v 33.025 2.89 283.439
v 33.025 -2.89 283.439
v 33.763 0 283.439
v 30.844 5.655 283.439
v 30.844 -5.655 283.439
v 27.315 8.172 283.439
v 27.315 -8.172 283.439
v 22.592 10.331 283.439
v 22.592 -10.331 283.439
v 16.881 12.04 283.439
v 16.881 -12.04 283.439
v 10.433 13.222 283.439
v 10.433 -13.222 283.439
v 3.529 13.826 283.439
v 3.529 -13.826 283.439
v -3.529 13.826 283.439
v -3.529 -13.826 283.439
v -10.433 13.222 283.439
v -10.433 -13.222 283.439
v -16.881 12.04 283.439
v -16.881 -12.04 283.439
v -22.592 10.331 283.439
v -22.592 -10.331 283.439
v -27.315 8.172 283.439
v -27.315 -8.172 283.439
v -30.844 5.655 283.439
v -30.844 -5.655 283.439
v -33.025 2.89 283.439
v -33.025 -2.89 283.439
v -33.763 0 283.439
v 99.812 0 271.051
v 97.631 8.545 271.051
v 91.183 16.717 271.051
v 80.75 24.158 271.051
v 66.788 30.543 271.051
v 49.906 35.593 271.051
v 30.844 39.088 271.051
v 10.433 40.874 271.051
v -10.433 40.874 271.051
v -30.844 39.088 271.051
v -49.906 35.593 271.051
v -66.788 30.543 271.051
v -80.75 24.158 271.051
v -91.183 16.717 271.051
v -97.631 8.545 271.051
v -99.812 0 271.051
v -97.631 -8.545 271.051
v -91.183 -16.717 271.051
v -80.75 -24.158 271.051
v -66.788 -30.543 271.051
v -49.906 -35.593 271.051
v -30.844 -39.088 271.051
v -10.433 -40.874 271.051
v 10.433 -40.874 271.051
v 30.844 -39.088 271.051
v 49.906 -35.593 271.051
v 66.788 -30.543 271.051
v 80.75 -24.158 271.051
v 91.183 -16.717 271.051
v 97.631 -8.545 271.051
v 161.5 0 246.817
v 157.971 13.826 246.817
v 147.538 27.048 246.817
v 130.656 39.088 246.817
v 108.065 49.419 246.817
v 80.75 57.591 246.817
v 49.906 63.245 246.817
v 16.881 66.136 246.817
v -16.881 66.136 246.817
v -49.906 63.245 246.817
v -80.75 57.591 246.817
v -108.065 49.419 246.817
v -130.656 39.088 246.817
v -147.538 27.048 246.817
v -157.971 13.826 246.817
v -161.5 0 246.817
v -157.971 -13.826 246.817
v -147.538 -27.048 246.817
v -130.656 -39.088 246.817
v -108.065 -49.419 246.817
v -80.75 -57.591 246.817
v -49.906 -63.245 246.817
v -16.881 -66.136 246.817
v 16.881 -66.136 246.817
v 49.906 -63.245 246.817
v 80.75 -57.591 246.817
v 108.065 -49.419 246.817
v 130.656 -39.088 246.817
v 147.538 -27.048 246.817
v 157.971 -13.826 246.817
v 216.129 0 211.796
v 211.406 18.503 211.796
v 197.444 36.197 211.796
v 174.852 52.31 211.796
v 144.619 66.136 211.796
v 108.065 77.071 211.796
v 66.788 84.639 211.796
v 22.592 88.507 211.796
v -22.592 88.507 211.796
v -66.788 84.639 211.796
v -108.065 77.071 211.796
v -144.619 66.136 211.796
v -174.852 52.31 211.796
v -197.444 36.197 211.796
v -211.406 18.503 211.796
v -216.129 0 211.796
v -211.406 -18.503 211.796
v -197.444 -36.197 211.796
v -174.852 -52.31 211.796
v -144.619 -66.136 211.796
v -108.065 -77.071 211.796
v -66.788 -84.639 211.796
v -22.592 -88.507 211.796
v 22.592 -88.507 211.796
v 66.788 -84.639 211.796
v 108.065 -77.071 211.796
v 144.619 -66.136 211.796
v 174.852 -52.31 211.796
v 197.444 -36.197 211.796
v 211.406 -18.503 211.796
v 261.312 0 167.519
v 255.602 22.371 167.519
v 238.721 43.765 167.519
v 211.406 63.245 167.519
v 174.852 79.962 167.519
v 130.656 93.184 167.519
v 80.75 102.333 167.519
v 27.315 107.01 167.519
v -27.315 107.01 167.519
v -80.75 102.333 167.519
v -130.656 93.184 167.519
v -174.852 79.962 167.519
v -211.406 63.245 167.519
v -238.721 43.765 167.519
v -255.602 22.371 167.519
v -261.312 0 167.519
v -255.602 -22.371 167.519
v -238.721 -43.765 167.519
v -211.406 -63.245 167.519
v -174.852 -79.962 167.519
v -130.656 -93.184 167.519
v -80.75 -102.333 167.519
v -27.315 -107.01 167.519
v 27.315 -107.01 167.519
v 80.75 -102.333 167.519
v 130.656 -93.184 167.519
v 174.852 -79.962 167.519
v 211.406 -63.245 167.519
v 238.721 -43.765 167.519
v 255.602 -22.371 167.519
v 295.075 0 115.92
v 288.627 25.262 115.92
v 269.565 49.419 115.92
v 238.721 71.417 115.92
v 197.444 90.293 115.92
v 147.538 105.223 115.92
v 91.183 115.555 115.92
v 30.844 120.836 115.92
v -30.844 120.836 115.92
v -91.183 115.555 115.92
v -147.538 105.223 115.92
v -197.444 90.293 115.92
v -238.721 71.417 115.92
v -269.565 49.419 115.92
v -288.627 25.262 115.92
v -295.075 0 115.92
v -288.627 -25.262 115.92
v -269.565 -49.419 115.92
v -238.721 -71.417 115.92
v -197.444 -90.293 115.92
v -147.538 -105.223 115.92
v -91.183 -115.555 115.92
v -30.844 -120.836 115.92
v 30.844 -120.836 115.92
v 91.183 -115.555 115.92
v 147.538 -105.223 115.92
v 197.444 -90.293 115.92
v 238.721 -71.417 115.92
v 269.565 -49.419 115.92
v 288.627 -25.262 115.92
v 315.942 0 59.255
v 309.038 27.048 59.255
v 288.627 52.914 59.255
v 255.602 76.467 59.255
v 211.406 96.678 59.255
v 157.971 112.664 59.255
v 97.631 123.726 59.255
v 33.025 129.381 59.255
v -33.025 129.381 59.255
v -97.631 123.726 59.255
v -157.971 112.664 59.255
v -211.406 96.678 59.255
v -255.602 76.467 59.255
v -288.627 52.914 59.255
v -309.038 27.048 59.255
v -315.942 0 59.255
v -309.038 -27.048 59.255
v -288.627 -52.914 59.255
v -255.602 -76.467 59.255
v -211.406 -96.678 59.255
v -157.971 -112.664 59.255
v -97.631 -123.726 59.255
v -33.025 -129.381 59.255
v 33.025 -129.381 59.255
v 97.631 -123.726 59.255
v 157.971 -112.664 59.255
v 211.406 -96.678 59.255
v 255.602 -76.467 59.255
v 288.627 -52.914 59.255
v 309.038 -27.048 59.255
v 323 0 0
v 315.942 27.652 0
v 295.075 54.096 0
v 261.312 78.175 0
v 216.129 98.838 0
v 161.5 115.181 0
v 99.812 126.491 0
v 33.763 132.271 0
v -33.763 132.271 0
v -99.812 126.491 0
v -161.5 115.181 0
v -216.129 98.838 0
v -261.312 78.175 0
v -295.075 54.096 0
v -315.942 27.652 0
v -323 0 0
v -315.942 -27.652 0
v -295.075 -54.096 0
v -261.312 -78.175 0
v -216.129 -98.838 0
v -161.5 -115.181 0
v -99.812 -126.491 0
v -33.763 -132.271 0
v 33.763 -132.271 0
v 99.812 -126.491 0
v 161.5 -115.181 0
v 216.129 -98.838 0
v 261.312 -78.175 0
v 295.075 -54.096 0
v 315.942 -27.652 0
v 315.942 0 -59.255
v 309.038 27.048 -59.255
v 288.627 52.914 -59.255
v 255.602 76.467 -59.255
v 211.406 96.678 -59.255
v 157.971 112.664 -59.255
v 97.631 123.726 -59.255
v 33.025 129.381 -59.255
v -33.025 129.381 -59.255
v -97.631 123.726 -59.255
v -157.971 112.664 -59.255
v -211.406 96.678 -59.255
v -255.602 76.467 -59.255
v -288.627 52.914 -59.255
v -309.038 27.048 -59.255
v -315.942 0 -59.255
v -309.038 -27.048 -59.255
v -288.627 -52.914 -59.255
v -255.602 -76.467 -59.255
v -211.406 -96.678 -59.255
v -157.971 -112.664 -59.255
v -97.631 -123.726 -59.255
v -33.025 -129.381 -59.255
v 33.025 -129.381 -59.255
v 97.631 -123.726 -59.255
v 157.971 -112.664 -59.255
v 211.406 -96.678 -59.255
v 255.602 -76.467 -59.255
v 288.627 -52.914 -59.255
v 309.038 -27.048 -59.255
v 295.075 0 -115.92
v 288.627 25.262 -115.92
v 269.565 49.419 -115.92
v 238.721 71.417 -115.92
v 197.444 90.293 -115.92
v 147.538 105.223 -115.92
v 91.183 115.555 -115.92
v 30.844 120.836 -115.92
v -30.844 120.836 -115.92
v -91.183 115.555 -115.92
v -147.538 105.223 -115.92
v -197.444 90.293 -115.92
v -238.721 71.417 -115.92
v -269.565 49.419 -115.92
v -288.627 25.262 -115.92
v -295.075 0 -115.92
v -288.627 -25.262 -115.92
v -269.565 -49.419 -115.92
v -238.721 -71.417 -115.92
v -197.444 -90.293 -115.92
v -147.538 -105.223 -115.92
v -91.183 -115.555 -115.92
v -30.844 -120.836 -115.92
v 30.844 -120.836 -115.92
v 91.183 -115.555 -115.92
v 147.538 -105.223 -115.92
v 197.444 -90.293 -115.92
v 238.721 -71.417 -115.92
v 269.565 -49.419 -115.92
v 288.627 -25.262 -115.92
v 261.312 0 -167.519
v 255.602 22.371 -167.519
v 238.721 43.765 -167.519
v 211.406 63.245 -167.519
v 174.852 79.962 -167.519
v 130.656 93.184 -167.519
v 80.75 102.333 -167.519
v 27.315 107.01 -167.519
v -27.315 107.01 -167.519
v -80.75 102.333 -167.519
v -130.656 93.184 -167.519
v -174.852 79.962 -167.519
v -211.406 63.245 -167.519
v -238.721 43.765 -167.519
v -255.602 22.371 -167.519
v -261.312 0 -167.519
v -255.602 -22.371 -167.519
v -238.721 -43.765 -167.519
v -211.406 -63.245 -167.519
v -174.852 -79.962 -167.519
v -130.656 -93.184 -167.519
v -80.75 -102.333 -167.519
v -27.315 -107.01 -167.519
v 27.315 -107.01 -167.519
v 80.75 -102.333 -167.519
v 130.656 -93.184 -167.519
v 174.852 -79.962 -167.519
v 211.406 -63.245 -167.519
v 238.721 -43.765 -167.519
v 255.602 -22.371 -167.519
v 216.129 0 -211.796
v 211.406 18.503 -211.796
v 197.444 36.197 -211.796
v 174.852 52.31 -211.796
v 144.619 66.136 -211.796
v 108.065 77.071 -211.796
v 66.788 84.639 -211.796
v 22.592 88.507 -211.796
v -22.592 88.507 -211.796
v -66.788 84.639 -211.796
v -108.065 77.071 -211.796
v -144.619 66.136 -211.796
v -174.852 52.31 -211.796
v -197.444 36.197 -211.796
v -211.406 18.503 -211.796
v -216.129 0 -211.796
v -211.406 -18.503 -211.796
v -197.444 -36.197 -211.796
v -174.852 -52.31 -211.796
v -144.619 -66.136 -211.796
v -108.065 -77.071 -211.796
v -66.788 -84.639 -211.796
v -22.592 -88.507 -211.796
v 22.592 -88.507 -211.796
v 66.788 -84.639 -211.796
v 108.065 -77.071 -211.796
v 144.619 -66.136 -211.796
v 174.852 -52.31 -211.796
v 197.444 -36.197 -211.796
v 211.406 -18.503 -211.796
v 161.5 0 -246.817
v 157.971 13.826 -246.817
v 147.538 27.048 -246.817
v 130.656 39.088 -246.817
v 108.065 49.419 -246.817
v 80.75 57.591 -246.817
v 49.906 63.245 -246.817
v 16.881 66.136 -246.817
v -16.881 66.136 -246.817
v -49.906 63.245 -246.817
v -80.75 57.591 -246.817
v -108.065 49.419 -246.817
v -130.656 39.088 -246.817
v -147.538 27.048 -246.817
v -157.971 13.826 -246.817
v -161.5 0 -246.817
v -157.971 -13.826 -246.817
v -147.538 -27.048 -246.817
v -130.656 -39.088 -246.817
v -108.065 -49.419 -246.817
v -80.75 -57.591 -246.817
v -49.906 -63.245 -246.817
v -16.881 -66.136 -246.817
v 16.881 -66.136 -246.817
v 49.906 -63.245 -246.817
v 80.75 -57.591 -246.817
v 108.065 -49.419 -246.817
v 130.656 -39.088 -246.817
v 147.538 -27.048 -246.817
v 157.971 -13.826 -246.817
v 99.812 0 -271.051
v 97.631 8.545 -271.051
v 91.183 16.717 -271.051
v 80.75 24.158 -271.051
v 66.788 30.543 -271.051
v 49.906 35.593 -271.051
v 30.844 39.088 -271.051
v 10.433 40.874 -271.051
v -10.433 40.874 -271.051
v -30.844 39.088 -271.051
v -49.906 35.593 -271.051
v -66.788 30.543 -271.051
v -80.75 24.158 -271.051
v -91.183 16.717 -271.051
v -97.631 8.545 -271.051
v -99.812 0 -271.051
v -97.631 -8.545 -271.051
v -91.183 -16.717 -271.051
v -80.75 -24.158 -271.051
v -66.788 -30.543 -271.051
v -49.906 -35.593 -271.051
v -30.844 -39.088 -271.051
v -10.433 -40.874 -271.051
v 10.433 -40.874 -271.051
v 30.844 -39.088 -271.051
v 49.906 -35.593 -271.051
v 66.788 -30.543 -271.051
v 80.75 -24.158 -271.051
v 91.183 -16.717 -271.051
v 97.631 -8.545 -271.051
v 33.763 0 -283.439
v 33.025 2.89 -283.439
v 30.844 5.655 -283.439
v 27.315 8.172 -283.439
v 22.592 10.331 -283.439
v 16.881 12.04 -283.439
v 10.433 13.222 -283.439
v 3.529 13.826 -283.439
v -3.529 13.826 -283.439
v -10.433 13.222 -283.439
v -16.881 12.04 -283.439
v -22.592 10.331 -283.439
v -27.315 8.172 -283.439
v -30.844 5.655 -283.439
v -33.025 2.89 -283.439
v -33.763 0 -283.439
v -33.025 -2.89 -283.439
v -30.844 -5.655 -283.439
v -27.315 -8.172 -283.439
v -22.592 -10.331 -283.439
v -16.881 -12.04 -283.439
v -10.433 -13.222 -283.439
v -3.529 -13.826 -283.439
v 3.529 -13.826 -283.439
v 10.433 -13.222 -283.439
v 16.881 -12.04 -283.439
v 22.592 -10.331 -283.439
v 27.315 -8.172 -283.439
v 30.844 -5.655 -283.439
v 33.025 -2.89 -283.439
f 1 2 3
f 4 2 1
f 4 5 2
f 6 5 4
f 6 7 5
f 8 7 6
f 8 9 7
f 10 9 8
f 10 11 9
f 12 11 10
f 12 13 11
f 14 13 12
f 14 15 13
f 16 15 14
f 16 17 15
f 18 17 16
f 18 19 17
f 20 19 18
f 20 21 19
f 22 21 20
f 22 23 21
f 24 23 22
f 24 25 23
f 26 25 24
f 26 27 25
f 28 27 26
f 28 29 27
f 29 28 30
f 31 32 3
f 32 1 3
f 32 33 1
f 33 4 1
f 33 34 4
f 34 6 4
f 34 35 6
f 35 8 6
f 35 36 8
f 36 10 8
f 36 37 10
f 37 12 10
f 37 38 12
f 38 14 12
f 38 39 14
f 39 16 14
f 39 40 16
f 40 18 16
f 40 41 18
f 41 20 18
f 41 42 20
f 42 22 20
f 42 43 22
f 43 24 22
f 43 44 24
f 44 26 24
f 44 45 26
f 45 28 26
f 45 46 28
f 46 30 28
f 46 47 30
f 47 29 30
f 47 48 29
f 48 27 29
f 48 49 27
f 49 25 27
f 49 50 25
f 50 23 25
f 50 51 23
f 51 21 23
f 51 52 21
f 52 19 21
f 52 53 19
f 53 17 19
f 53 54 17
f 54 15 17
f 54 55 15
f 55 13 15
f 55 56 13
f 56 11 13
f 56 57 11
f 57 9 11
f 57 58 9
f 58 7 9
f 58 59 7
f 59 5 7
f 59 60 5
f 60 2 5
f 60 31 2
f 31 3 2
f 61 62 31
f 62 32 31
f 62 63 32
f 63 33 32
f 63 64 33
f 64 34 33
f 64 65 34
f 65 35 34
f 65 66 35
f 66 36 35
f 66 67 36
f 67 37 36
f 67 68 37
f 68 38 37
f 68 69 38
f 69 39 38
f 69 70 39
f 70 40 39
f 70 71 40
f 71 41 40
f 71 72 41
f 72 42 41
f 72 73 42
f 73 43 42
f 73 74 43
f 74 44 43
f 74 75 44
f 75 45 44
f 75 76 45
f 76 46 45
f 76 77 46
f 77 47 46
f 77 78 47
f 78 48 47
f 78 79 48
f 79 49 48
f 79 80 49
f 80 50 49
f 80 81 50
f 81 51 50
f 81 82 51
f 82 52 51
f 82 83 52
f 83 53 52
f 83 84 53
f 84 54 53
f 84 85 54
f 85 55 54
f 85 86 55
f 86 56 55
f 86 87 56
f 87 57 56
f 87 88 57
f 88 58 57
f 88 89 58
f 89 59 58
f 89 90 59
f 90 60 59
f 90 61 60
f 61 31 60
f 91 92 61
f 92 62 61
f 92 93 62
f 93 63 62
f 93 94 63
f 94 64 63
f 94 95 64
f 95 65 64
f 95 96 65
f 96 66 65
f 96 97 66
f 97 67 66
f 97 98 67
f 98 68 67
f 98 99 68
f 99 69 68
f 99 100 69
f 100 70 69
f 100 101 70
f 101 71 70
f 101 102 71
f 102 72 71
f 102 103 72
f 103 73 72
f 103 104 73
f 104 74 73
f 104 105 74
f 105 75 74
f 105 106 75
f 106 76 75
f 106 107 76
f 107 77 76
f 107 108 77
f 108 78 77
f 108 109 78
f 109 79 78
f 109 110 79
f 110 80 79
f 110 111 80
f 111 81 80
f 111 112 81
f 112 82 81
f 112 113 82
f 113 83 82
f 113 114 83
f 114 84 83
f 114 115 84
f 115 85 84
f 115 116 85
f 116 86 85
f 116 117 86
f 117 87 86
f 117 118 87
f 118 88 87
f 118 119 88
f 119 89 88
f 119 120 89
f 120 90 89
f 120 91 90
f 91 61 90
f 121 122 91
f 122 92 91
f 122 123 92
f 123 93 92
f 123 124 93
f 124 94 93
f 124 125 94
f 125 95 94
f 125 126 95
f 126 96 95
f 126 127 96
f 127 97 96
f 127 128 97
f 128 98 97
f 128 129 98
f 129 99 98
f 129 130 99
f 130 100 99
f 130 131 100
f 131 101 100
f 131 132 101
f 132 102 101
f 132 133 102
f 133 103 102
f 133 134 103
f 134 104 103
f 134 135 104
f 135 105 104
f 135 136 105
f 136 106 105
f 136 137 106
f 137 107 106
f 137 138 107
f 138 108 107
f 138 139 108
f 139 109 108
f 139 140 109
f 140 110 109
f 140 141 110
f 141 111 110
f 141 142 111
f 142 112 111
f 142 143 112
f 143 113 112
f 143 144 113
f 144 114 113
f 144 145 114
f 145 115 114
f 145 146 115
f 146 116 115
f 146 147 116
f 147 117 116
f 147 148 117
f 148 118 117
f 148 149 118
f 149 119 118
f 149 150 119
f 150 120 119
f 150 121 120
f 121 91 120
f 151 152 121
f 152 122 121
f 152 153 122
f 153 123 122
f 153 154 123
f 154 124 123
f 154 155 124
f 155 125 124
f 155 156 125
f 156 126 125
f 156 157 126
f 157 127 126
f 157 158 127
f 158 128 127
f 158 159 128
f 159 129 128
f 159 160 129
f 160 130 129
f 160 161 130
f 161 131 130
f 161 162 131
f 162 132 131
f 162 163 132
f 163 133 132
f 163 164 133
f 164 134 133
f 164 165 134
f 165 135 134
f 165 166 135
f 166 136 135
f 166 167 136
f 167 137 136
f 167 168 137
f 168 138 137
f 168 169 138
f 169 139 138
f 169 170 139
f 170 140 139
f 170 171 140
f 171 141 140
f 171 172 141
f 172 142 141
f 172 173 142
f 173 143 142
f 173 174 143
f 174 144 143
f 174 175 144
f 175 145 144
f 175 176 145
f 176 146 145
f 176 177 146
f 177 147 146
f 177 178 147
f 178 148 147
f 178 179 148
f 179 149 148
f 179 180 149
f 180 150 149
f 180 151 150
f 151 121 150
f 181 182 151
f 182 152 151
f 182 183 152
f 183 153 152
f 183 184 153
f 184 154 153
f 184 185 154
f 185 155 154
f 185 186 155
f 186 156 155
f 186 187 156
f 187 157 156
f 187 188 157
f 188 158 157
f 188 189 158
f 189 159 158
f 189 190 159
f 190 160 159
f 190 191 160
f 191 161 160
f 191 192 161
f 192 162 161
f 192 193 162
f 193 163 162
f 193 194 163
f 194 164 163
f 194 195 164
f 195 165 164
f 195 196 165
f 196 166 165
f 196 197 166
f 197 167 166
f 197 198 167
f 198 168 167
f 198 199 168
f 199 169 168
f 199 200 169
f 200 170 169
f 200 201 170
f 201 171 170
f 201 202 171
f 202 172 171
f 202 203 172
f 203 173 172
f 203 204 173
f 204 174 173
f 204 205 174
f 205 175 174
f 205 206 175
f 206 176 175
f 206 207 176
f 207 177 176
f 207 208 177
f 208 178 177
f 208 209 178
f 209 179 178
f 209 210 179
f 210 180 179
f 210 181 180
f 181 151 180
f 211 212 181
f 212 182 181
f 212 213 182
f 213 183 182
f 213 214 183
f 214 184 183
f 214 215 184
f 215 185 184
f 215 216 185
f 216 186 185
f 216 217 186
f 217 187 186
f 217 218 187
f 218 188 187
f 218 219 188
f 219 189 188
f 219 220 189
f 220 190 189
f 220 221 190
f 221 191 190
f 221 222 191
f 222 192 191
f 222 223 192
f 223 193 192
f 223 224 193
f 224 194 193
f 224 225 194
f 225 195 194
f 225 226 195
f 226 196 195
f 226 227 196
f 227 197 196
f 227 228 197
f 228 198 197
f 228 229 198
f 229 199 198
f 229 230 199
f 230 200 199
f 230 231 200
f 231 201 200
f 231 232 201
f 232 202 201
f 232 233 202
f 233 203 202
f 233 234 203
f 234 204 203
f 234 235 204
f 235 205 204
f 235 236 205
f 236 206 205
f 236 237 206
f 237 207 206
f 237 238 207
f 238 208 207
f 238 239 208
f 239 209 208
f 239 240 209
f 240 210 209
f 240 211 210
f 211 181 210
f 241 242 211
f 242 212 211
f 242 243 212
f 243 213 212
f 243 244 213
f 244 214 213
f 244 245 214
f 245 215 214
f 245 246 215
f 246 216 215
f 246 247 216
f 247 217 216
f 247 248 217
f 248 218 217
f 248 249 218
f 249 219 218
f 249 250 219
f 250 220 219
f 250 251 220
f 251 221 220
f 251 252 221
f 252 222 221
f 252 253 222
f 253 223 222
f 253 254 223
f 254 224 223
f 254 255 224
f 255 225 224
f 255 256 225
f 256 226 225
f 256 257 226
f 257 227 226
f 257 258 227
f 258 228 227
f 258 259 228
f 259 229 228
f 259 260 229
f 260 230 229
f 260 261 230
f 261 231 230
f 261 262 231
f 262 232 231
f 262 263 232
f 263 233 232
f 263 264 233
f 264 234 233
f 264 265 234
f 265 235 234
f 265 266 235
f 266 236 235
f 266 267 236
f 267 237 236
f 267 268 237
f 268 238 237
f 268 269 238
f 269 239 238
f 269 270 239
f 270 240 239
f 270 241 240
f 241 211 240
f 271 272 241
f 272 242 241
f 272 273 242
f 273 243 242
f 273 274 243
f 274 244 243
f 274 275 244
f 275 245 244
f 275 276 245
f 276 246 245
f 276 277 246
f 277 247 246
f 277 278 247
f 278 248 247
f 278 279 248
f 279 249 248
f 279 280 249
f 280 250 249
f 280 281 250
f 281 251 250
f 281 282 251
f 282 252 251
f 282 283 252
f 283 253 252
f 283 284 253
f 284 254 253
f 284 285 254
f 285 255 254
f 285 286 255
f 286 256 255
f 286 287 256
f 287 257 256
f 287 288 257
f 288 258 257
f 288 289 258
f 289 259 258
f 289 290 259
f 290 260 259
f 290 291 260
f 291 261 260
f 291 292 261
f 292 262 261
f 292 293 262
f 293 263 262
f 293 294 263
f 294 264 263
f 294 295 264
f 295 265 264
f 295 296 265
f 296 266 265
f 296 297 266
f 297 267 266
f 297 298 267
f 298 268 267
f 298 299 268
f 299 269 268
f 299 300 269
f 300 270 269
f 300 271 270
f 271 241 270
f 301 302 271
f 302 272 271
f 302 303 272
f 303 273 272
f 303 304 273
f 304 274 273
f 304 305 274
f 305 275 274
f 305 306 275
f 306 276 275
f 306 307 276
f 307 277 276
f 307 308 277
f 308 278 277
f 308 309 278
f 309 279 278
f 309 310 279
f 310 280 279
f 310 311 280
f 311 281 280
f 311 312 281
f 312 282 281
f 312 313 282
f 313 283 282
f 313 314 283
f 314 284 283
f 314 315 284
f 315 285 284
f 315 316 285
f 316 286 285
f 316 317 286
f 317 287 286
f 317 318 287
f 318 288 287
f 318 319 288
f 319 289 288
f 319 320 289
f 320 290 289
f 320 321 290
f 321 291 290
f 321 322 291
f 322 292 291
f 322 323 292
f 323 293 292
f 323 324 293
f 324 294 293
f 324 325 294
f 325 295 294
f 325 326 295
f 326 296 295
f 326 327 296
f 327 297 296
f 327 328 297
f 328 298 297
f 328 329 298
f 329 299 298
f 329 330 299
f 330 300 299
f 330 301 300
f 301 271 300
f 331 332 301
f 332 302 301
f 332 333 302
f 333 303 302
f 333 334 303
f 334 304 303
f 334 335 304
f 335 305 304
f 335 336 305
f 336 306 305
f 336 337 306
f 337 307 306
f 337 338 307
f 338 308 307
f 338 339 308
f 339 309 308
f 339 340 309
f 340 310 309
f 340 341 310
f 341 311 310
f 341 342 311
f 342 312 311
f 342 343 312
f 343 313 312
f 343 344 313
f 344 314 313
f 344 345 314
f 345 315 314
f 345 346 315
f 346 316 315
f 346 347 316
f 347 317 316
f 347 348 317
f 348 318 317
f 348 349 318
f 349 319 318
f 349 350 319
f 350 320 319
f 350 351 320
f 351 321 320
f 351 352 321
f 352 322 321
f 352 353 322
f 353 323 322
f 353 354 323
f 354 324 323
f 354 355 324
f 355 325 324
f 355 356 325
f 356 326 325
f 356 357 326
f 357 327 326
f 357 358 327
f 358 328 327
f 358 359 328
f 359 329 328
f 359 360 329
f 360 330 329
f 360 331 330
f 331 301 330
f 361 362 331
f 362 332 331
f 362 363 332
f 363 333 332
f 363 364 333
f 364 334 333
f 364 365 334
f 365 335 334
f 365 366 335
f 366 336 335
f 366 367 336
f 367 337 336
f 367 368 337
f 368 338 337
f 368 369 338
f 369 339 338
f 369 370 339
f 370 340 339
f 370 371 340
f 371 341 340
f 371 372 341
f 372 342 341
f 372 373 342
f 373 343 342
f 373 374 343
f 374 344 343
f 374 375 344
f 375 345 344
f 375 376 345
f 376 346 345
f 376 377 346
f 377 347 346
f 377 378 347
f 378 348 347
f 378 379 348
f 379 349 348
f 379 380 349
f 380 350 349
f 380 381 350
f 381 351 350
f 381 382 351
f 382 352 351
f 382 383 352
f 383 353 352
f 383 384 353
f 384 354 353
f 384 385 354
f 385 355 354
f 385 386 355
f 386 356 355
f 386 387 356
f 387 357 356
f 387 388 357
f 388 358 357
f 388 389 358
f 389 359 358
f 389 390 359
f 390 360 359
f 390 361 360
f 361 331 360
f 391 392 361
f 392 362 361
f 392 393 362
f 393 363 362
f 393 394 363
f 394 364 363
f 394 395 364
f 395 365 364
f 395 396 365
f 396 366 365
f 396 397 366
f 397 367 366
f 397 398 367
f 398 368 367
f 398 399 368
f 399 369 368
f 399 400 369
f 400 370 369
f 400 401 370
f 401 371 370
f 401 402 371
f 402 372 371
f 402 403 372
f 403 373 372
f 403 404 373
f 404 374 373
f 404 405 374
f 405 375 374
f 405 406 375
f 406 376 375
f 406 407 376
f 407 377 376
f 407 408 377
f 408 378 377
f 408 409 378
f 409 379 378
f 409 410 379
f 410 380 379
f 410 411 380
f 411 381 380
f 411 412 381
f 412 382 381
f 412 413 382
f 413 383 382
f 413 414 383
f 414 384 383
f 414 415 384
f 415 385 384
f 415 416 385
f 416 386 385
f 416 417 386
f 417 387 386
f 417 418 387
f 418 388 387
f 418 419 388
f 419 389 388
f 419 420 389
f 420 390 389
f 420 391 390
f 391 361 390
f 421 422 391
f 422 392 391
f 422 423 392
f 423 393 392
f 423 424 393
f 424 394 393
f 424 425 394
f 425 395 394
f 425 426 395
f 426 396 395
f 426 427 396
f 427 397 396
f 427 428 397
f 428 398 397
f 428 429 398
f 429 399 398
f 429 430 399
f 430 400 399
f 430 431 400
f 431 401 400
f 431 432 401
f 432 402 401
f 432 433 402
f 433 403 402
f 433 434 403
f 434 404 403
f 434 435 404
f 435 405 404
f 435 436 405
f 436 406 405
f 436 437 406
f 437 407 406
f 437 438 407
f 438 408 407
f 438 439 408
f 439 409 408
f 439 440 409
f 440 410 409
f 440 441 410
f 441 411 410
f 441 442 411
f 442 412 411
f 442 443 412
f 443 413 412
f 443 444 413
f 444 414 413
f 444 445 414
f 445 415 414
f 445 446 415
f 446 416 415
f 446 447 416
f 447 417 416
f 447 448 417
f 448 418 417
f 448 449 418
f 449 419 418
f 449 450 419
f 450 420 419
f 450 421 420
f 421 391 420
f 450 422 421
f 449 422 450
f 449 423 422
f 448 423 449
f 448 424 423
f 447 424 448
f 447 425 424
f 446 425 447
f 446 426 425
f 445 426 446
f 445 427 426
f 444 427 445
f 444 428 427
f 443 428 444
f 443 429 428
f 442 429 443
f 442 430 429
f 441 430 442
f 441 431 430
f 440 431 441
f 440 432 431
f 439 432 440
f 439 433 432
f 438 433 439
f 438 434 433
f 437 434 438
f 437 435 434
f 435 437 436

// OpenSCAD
// Generated by SolidPython 1.0.1 on 2020-07-29 00:46:52


scale(v = [17, 7, 15]) {
	sphere(r = 19);
}
/***********************************************
*********      SolidPython code:      **********
************************************************
 
# import packages: SolidPython
from solid import *
from solid.utils import *
from itertools import chain, combinations, permutations


class Resize:

    def __init__(self, scad_file):
        self.scad_file = scad_file
        #self.scad_file = import_scad(scad_file)
        # cone/cylinder param:
        self.r1 = 0
        self.r2 = 0
        self.h = 0
        # rectangular prism param:
        self.w = 0
        self.l = 0
        # ellipse param:
        self.r = 0

    # import OpenScad code (file name corresponds to shape)


    # classify shape + parameters
    def assign(self, param1, param2, param3):
        if self.scad_file == 'cone.scad':
            self.r1 = param1
            self.r2 = param2
            self.h = param3
        elif self.scad_file == 'cylinder.scad':
            self.r1 = param1
            self.r2 = param2
            self.h = param3
        elif self.scad_file == 'rectangularPrism.scad':
            self.h = param1
            self.l = param2
            self.w = param3
        else:
            self.r = param1
            self.h = param2

    # resize parameters
    def iterate(self):
        x = range(3, 20, 2)
        i = 1
        if self.scad_file == 'cone.scad':
            tempList = list(permutations(x, 2))
            for temp in tempList:
                param1 = temp[0]
                param2 = temp[1]
                filepath = 'produced_scad_files/' + 'cone' + str(param1) + '_' + str(param2) + '_' + '.scad'
                scad_render_to_file(cylinder(h=param1, r1=param2, r2=0), filepath)

        elif self.scad_file == 'cylinder.scad':
            tempList = list(permutations(x, 3))
            for temp in tempList:
                param1 = temp[0]
                param2 = temp[1]
                filepath = 'produced_scad_files/' + 'cylinder' + str(param1) + '_' + str(param2) + '_' + '.scad'
                scad_render_to_file(cylinder(h=param1, r1=param2, r2=param2), filepath)

        elif self.scad_file == 'rectangularPrism.scad':
            tempList = list(permutations(x, 3))
            for temp in tempList:
                param1 = temp[0]
                param2 = temp[1]
                param3 = temp[2]
                filepath = 'produced_scad_files/' + 'rectangularPrism' + str(param1) + '_' + str(param2) + '_' + str(
                    param3) + '.scad'
                scad_render_to_file(cube(size=(param1, param2, param3)), filepath)

        elif self.scad_file == 'ellipse.scad':
            tempList = list(permutations(x, 4))
            for temp in tempList:
                param1 = temp[0]
                param2 = temp[1]
                param3 = temp[2]
                param4 = temp[3]
                filepath = 'produced_scad_files/' + 'ellipse' + str(param1) + '_' + str(param2) + '_' + str(param3) + '_' + str(param4) + '.scad'
                scad_render_to_file(scale([param1, param2, param3])(sphere(r=param4)), filepath)

    def render_to_scadfile(self):
        scad_render_to_file(scad, 'example.scad') 
 
************************************************/
